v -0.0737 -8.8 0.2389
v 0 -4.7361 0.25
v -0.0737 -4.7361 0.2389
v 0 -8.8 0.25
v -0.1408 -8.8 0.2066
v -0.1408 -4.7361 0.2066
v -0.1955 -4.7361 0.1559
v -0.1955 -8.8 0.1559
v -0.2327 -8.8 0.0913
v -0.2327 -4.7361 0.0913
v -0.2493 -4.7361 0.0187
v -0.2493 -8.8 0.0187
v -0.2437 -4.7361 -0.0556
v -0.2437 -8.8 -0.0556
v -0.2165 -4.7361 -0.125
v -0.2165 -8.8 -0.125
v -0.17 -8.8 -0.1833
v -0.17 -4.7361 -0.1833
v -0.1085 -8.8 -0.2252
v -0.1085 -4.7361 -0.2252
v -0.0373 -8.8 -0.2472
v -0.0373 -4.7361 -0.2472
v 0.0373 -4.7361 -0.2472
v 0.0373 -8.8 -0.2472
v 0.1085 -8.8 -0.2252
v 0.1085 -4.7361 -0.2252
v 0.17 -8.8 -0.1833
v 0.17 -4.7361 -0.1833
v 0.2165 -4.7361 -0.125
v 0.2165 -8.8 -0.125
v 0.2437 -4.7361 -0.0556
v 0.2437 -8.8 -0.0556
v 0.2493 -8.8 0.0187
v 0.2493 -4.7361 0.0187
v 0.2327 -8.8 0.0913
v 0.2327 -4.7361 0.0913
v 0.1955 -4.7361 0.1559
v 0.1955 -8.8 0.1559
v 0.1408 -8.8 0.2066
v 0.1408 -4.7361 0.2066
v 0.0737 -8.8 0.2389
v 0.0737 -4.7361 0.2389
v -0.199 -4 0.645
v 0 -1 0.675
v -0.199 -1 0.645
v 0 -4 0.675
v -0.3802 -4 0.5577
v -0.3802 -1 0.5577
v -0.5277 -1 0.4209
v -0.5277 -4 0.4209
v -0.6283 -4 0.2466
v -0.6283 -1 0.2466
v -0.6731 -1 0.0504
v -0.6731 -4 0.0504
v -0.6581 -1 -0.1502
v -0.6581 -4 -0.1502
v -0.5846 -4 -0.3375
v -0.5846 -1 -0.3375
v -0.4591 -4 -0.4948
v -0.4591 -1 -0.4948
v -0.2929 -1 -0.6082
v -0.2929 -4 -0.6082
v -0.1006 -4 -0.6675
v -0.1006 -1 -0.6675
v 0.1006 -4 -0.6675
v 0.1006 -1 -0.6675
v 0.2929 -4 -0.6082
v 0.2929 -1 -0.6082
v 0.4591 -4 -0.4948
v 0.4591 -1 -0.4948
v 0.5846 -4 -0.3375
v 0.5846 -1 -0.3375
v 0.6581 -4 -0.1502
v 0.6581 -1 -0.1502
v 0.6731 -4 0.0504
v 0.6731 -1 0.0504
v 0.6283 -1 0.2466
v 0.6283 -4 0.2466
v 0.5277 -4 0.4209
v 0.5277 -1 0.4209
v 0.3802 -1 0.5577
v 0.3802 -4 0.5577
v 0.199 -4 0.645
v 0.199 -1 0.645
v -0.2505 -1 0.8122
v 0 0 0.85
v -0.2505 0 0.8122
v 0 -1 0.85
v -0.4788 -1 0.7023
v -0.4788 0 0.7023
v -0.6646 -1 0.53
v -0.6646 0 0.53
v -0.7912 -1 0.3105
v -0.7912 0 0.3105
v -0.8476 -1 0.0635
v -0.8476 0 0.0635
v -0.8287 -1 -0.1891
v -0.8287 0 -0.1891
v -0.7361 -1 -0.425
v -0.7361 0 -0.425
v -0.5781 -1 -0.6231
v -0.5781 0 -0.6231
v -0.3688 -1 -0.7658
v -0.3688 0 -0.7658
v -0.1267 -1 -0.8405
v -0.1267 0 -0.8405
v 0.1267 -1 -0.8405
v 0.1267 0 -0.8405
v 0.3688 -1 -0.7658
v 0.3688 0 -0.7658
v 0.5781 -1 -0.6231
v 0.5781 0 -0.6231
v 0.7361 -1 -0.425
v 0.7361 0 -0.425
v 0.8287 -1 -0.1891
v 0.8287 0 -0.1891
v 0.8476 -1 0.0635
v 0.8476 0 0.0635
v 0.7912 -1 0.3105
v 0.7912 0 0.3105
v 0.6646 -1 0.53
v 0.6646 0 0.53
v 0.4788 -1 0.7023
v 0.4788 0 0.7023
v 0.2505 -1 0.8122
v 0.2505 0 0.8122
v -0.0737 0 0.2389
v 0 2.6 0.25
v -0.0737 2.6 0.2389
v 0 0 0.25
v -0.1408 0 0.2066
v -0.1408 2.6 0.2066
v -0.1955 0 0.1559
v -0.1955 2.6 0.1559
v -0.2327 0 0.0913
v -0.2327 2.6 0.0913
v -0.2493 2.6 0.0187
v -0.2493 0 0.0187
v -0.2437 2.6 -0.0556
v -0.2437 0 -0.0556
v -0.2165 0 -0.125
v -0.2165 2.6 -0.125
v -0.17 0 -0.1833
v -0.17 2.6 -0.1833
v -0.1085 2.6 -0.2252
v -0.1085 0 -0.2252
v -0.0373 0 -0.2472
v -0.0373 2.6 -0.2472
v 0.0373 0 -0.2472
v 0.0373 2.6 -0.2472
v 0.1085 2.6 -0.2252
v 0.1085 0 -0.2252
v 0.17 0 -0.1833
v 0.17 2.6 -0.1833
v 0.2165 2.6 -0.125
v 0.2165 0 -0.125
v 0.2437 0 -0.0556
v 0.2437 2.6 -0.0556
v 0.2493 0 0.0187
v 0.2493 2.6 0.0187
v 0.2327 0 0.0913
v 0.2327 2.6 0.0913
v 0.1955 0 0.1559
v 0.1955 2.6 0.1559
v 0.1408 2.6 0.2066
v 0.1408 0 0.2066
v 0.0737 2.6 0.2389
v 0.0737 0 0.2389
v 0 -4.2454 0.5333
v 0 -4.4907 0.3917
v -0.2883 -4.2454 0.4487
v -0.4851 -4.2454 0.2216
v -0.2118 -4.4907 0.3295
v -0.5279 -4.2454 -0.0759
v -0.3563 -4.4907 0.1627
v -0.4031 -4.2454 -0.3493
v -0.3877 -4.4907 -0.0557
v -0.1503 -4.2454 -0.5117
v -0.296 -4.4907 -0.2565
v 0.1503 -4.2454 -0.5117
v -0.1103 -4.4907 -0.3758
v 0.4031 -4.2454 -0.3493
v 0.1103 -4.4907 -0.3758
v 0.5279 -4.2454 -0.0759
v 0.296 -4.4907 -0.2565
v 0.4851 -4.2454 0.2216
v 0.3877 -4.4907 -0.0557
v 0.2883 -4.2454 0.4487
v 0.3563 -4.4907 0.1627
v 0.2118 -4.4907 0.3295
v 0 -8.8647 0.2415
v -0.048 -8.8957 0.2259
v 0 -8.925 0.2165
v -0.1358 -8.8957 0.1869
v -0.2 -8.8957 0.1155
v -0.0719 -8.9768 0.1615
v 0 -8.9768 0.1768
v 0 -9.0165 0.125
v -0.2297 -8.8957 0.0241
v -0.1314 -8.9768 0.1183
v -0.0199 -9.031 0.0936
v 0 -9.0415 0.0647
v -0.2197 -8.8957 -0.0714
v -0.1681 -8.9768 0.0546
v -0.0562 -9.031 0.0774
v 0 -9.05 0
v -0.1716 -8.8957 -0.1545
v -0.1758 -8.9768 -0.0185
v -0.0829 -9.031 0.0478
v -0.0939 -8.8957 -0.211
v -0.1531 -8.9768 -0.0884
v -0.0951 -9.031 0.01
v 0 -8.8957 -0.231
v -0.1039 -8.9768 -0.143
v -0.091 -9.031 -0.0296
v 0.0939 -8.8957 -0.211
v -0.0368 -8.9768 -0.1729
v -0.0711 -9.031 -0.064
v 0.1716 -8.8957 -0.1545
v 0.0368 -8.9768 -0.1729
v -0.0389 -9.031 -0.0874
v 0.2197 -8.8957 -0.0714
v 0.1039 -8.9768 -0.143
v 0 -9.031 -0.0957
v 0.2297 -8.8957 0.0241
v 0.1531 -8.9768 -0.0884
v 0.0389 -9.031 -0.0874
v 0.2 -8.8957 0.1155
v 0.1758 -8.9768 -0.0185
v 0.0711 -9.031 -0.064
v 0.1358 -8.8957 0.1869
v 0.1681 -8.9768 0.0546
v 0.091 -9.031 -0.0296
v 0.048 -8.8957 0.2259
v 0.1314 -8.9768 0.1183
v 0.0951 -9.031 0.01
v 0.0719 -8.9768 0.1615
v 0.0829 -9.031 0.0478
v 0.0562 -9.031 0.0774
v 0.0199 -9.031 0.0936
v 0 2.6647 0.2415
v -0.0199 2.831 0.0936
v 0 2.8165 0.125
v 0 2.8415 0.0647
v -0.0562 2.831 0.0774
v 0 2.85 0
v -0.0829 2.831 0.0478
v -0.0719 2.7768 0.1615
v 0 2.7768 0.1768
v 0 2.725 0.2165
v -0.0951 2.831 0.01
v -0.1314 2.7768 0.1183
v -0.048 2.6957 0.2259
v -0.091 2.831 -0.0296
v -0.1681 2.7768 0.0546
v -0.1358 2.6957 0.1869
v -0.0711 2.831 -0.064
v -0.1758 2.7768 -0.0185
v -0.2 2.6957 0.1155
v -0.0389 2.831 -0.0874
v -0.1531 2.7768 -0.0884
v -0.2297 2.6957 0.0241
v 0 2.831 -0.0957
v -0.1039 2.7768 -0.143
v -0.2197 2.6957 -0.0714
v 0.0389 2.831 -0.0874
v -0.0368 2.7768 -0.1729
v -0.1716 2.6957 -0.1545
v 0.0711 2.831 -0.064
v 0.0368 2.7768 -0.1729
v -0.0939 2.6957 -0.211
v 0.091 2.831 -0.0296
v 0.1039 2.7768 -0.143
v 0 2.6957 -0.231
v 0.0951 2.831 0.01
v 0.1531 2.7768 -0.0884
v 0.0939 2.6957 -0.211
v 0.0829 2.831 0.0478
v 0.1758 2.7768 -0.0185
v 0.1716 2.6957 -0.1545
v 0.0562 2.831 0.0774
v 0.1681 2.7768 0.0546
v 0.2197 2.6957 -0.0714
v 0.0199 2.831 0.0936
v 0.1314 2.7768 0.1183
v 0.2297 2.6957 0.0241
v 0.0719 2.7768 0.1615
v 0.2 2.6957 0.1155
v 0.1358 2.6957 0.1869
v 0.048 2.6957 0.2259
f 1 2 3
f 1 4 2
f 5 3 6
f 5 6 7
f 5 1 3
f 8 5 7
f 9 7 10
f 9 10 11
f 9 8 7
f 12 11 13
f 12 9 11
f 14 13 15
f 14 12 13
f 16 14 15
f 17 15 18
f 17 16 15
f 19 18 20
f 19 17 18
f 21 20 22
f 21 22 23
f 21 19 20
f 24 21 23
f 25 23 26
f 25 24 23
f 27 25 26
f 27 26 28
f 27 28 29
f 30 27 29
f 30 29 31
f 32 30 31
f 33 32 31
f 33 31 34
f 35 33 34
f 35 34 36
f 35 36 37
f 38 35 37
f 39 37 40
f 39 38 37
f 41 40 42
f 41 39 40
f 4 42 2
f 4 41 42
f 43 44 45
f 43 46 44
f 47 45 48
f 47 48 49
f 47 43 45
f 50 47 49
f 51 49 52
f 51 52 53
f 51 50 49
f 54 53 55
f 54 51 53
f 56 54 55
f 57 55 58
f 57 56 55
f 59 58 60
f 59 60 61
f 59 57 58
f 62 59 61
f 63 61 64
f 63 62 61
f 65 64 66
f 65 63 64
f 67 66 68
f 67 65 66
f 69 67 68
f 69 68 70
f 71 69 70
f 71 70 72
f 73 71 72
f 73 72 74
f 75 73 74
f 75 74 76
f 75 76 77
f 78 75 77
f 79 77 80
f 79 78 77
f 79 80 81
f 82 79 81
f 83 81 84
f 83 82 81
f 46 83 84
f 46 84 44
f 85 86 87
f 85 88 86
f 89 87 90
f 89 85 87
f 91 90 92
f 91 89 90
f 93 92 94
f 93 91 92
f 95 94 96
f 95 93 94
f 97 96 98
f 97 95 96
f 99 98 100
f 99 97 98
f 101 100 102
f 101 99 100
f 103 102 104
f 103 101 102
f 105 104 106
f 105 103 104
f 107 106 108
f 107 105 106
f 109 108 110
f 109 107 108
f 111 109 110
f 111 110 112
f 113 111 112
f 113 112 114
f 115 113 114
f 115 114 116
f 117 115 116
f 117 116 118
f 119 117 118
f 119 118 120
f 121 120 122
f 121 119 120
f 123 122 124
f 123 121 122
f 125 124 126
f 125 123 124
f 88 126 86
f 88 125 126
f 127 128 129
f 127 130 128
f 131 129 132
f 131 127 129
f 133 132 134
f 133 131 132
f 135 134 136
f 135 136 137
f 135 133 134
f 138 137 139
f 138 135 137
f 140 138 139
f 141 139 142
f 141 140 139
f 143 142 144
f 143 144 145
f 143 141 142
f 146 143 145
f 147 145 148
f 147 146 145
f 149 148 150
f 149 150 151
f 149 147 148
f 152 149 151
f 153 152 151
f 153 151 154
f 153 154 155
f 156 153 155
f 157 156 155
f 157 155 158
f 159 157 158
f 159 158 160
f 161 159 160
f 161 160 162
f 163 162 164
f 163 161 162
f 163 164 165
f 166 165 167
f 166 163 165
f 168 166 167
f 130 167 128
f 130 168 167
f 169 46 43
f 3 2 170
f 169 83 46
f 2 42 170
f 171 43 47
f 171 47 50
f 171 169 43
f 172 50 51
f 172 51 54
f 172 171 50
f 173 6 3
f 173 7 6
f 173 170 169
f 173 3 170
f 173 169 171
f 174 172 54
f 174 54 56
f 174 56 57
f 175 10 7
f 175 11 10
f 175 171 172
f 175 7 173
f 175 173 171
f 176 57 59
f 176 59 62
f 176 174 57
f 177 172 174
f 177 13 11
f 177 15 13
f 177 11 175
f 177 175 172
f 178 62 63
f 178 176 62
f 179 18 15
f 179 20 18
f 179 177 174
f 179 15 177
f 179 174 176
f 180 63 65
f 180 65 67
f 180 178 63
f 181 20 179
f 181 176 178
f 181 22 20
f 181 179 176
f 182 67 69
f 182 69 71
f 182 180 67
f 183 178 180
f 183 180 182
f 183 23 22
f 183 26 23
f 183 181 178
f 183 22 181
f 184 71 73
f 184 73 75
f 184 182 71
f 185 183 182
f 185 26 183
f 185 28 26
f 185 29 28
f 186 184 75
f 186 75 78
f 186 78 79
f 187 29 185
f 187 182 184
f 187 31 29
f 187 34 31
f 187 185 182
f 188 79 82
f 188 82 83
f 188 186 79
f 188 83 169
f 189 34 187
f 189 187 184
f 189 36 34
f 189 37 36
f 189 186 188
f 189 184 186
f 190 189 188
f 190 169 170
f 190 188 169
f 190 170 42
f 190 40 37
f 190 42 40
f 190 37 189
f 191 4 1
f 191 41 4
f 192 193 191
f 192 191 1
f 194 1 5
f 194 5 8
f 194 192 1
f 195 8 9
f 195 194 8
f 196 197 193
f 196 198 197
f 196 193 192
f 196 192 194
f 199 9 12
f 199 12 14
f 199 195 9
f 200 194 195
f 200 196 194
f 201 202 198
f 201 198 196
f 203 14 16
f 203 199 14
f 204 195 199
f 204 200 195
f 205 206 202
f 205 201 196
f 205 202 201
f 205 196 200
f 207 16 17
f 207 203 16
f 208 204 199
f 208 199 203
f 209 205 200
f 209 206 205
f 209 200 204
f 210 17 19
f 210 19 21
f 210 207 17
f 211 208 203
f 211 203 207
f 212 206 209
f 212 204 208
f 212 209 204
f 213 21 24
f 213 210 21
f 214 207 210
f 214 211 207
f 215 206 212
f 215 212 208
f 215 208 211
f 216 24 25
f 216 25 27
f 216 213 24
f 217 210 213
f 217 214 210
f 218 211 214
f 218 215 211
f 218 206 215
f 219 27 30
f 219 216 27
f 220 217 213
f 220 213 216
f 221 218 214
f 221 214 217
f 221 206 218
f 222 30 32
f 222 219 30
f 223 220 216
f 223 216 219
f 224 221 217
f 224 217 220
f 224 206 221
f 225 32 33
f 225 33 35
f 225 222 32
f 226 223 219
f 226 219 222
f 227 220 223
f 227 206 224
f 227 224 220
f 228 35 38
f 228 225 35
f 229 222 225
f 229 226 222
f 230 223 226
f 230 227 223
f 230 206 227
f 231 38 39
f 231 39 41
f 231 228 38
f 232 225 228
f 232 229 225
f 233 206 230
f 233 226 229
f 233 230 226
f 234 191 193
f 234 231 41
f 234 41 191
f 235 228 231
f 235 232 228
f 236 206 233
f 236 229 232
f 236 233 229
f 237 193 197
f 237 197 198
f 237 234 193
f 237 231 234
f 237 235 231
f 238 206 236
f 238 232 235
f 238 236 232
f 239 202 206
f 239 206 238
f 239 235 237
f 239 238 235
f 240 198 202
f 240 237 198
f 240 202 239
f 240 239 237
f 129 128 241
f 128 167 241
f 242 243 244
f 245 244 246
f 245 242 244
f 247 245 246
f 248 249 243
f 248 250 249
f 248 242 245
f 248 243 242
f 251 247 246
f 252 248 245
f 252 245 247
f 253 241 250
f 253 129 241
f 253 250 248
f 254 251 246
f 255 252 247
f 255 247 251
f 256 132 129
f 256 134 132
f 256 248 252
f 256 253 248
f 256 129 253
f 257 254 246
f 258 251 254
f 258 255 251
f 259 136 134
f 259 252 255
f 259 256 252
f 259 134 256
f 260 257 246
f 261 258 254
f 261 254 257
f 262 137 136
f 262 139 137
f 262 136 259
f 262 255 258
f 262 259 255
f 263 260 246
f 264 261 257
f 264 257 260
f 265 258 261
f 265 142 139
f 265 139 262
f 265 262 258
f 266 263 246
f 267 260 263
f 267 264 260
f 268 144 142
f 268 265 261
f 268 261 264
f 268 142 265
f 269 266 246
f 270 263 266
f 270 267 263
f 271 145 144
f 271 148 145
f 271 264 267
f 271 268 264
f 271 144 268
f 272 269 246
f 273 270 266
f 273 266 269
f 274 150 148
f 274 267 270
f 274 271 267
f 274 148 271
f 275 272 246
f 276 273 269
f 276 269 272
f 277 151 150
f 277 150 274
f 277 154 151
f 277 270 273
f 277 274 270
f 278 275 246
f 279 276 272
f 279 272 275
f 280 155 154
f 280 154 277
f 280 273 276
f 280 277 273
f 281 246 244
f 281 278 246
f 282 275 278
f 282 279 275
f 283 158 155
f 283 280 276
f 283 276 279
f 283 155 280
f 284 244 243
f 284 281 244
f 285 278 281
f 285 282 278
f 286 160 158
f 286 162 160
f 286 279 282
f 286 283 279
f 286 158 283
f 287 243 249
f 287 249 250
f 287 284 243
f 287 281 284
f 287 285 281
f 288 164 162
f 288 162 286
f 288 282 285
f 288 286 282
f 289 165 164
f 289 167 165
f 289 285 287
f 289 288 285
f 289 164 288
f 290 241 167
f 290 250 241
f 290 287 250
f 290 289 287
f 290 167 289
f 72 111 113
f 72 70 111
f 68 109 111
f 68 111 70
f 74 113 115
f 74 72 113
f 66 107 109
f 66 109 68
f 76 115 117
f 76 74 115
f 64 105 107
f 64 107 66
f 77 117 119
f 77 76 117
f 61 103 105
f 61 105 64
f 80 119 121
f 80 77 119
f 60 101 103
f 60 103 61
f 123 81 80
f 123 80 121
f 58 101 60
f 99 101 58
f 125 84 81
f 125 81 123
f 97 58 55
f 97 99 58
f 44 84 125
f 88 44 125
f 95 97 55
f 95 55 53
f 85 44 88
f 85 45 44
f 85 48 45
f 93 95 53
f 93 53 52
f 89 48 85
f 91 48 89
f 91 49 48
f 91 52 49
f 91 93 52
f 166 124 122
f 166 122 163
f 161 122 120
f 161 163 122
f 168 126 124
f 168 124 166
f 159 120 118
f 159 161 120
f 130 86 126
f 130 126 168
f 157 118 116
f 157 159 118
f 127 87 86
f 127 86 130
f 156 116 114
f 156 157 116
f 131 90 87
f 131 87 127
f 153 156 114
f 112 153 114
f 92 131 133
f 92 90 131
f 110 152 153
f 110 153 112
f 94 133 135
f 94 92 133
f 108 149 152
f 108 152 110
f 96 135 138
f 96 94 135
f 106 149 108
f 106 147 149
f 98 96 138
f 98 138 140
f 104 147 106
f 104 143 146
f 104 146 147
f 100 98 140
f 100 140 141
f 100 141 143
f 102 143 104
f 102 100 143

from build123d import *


with BuildPart() as part:
    # Sketch1 → Revolve1 (revolve)
    with BuildSketch(Plane.XY, mode=Mode.PRIVATE) as revolve1_sk:
        with BuildLine():
            Line((-0.85, 0), (-0.85, -1))
            Line((-0.85, -1), (-0.675, -1))
            Line((-0.675, -1), (-0.675, -4))
            Line((-0.675, -4), (-0.25, -4.736121593))
            Line((-0.25, -4.736121593), (-0.25, -8.8))
            ThreePointArc((-0.25, -8.8), (-0.176776695, -8.976776695), (0, -9.05))
            Line((0, -9.05), (0, 2.85))
            ThreePointArc((0, 2.85), (-0.176776695, 2.776776695), (-0.25, 2.6))
            Line((-0.25, 2.6), (-0.25, 0))
            Line((-0.25, 0), (-0.85, 0))
        make_face()
    revolve(revolve1_sk.sketch.rotate(Axis((0, 28.992562867, 0), (0, -1, 0)), 270), axis=Axis((0, 28.992562867, 0), (0, -1, 0)))


solid = part.part
